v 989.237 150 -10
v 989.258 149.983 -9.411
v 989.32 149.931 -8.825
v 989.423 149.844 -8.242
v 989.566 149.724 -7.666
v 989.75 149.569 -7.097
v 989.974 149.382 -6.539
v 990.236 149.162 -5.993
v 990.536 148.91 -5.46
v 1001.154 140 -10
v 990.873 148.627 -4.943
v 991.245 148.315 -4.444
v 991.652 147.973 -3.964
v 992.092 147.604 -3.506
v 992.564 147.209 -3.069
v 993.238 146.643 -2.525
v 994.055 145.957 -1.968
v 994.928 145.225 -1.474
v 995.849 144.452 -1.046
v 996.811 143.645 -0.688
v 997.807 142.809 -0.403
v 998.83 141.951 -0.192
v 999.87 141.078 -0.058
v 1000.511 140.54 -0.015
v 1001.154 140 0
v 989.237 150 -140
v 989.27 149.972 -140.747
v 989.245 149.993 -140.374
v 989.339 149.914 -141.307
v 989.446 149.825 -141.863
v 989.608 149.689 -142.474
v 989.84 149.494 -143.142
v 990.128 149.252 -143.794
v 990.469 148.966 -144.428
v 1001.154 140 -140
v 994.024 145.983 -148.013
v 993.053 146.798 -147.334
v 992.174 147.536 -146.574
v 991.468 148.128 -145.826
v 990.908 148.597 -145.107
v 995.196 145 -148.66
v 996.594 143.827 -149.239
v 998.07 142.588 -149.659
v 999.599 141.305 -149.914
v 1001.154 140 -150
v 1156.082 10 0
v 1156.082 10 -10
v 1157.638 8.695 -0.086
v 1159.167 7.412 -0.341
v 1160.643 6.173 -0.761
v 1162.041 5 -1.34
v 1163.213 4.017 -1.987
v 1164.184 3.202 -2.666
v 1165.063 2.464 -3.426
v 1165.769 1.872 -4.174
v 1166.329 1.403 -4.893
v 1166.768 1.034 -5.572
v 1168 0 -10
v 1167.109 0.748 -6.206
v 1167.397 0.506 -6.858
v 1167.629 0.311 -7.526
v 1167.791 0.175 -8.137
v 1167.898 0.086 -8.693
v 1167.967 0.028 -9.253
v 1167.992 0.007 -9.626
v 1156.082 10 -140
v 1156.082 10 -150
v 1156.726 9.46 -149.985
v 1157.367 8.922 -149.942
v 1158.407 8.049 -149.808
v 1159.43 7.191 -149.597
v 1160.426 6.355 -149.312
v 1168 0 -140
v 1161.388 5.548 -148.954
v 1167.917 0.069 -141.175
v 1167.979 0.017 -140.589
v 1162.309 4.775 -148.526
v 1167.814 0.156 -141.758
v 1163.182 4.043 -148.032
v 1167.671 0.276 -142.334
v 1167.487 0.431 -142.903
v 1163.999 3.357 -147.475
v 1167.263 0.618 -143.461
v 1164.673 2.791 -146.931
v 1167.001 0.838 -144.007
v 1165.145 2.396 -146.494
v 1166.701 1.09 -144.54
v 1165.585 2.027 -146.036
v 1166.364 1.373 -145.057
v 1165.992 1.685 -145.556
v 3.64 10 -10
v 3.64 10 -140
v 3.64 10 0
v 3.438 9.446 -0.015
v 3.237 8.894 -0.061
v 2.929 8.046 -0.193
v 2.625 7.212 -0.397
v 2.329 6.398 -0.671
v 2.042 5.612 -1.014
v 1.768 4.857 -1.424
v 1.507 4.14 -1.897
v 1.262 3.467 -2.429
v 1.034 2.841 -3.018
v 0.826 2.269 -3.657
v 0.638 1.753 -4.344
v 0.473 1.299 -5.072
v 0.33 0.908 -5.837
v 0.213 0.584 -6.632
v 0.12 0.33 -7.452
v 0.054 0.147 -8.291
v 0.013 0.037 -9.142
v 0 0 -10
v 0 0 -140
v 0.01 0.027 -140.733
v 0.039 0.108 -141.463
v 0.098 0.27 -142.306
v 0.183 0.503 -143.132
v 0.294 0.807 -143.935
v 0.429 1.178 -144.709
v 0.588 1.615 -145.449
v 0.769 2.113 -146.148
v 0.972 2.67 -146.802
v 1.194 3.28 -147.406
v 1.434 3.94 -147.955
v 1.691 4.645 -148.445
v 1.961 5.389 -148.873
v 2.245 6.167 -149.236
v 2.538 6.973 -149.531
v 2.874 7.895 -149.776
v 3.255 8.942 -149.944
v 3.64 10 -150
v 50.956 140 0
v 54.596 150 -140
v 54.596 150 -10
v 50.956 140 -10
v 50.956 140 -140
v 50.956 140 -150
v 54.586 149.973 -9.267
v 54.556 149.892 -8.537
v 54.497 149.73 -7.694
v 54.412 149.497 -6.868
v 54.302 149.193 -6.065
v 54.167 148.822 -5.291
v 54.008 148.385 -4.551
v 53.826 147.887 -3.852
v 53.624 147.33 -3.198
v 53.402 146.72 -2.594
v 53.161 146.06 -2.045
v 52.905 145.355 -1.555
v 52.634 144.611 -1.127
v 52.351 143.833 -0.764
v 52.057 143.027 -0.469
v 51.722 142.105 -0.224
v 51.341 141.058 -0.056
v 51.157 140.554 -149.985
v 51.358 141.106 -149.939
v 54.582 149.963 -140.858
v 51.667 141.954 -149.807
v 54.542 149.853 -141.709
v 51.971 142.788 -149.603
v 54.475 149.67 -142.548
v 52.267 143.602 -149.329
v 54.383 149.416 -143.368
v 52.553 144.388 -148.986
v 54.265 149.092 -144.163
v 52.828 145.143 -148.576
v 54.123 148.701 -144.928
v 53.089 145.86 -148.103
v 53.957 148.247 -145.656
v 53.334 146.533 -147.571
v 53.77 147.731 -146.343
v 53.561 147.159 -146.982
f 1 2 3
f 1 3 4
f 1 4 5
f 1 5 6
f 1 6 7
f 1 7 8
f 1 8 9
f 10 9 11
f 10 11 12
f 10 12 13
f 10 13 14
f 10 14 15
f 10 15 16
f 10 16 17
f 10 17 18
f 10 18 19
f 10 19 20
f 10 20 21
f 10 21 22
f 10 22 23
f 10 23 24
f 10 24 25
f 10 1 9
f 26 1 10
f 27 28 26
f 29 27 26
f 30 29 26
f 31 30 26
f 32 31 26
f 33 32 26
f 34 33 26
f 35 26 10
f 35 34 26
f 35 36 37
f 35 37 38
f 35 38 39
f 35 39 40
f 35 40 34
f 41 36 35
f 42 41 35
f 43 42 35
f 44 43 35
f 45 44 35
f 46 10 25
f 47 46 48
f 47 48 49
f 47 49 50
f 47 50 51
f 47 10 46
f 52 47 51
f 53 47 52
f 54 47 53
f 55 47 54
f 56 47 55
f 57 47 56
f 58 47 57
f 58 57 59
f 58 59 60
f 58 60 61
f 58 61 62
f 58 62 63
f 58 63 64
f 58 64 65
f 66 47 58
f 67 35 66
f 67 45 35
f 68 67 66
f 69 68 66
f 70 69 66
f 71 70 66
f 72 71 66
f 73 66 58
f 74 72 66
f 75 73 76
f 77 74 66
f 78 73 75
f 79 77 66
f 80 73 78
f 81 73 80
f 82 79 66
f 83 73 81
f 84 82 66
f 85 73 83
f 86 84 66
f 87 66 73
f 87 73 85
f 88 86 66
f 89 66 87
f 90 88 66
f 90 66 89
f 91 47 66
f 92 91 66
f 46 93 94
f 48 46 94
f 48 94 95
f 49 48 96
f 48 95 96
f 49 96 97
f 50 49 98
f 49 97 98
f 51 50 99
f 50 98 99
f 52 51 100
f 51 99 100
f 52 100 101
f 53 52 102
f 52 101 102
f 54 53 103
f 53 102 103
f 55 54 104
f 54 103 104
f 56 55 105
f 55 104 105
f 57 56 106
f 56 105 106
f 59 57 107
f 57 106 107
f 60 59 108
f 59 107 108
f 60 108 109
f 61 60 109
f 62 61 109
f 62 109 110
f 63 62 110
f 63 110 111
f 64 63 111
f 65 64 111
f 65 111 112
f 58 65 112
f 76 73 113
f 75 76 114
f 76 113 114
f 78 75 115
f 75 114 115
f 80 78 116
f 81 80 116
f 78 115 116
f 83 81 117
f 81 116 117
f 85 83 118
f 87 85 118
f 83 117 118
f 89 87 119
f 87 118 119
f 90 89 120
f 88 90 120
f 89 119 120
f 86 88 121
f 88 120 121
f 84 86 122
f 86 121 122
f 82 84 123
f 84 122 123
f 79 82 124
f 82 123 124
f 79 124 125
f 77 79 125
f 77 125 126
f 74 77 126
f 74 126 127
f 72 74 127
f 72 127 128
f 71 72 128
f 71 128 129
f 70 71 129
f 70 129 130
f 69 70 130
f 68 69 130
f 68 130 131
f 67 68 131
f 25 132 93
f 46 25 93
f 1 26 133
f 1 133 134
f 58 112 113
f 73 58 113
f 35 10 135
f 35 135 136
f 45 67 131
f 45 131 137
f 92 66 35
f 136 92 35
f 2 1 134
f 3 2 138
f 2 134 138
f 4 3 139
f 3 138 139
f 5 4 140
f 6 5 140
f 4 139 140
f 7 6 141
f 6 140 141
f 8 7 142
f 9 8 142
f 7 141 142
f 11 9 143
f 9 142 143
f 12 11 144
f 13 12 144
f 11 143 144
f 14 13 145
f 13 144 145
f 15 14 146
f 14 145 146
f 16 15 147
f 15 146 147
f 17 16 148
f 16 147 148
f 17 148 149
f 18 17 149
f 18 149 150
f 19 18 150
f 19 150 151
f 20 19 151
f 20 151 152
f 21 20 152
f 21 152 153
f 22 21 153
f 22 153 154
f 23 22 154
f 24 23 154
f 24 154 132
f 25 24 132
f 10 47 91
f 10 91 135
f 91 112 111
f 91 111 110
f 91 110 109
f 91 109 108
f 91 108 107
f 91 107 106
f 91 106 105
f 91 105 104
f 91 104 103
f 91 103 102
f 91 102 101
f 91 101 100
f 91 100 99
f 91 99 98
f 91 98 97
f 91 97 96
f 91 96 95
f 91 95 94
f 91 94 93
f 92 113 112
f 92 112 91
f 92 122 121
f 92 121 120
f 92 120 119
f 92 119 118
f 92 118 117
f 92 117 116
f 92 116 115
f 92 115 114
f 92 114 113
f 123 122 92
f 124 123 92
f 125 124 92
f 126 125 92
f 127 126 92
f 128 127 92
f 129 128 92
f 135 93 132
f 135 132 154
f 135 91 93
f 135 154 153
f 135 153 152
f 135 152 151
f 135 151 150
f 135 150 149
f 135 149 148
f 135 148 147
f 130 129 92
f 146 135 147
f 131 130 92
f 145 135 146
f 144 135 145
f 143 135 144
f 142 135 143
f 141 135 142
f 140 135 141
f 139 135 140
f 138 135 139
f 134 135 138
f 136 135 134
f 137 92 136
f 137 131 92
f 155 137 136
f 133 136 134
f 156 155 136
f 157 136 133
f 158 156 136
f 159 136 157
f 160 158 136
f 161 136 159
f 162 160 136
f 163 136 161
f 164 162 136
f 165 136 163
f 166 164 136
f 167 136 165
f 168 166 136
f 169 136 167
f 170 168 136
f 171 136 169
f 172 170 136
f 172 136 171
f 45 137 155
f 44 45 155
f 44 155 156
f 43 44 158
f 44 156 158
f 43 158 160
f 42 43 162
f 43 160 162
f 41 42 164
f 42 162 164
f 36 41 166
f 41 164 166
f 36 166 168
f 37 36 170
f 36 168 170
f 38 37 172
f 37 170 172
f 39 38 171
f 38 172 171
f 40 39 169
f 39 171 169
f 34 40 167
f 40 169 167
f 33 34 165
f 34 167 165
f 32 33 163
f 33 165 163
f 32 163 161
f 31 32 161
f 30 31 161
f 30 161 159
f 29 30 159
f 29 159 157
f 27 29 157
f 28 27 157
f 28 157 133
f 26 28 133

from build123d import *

# Parameters (mm, degrees)
SKETCH1_W               = 130
SKETCH1_H               = 130
EXTRUDE1_DEPTH          = 1168
CUT_EXTRUDE1_DEPTH      = 1188.107408788
CUT_EXTRUDE1_DEPTH_BACK = 1188.107408788
CUT_EXTRUDE2_DEPTH      = 1188.107408788
CUT_EXTRUDE2_DEPTH_BACK = 1188.107408788


with BuildPart() as part:
    # Sketch1 → Extrude1 (new body)
    with BuildSketch(Plane(origin=(0, 0, 0), x_dir=(0, 0, -1), z_dir=(1, 0, 0))):
        with BuildLine():
            Line((10, 0), (140, 0))
            ThreePointArc((140, 0), (147.071067812, 2.928932188), (150, 10))
            Line((150, 10), (150, 140))
            ThreePointArc((150, 140), (147.071067812, 147.071067812), (140, 150))
            Line((140, 150), (10, 150))
            ThreePointArc((10, 150), (2.928932188, 147.071067812), (0, 140))
            Line((0, 140), (0, 10))
            ThreePointArc((0, 10), (2.928932188, 2.928932188), (10, 0))
        make_face()
        with Locations((75, 75)):
            Rectangle(SKETCH1_W, SKETCH1_H, mode=Mode.SUBTRACT)
    extrude(amount=EXTRUDE1_DEPTH)

    # Sketch2 → Cut-Extrude1 (cut, two sides: drawn at the far end of the back side and taken through both)
    with BuildSketch(Plane.XY.offset(-CUT_EXTRUDE1_DEPTH_BACK)):
        Polygon((2979.836763712, -1520.311560184), (1168, 0), (989.236961111, 150), (-822.599802601, 1670.311560184), (2218.023317767, 5293.985087608), (6020.459884081, 2103.36196724), align=None)
    extrude(amount=CUT_EXTRUDE1_DEPTH + CUT_EXTRUDE1_DEPTH_BACK, mode=Mode.SUBTRACT)

    # Sketch3 → Cut-Extrude2 (cut, two sides: drawn at the far end of the back side and taken through both)
    with BuildSketch(Plane.XY.offset(-CUT_EXTRUDE2_DEPTH_BACK)):
        Polygon((-808.940884793, -2222.546814643), (0, 0), (54.59553514, 150), (863.536419933, 2372.546814643), (-3581.557209352, 3990.428584229), (-5254.034514079, -604.665045056), align=None)
    extrude(amount=CUT_EXTRUDE2_DEPTH + CUT_EXTRUDE2_DEPTH_BACK, mode=Mode.SUBTRACT)


solid = part.part
